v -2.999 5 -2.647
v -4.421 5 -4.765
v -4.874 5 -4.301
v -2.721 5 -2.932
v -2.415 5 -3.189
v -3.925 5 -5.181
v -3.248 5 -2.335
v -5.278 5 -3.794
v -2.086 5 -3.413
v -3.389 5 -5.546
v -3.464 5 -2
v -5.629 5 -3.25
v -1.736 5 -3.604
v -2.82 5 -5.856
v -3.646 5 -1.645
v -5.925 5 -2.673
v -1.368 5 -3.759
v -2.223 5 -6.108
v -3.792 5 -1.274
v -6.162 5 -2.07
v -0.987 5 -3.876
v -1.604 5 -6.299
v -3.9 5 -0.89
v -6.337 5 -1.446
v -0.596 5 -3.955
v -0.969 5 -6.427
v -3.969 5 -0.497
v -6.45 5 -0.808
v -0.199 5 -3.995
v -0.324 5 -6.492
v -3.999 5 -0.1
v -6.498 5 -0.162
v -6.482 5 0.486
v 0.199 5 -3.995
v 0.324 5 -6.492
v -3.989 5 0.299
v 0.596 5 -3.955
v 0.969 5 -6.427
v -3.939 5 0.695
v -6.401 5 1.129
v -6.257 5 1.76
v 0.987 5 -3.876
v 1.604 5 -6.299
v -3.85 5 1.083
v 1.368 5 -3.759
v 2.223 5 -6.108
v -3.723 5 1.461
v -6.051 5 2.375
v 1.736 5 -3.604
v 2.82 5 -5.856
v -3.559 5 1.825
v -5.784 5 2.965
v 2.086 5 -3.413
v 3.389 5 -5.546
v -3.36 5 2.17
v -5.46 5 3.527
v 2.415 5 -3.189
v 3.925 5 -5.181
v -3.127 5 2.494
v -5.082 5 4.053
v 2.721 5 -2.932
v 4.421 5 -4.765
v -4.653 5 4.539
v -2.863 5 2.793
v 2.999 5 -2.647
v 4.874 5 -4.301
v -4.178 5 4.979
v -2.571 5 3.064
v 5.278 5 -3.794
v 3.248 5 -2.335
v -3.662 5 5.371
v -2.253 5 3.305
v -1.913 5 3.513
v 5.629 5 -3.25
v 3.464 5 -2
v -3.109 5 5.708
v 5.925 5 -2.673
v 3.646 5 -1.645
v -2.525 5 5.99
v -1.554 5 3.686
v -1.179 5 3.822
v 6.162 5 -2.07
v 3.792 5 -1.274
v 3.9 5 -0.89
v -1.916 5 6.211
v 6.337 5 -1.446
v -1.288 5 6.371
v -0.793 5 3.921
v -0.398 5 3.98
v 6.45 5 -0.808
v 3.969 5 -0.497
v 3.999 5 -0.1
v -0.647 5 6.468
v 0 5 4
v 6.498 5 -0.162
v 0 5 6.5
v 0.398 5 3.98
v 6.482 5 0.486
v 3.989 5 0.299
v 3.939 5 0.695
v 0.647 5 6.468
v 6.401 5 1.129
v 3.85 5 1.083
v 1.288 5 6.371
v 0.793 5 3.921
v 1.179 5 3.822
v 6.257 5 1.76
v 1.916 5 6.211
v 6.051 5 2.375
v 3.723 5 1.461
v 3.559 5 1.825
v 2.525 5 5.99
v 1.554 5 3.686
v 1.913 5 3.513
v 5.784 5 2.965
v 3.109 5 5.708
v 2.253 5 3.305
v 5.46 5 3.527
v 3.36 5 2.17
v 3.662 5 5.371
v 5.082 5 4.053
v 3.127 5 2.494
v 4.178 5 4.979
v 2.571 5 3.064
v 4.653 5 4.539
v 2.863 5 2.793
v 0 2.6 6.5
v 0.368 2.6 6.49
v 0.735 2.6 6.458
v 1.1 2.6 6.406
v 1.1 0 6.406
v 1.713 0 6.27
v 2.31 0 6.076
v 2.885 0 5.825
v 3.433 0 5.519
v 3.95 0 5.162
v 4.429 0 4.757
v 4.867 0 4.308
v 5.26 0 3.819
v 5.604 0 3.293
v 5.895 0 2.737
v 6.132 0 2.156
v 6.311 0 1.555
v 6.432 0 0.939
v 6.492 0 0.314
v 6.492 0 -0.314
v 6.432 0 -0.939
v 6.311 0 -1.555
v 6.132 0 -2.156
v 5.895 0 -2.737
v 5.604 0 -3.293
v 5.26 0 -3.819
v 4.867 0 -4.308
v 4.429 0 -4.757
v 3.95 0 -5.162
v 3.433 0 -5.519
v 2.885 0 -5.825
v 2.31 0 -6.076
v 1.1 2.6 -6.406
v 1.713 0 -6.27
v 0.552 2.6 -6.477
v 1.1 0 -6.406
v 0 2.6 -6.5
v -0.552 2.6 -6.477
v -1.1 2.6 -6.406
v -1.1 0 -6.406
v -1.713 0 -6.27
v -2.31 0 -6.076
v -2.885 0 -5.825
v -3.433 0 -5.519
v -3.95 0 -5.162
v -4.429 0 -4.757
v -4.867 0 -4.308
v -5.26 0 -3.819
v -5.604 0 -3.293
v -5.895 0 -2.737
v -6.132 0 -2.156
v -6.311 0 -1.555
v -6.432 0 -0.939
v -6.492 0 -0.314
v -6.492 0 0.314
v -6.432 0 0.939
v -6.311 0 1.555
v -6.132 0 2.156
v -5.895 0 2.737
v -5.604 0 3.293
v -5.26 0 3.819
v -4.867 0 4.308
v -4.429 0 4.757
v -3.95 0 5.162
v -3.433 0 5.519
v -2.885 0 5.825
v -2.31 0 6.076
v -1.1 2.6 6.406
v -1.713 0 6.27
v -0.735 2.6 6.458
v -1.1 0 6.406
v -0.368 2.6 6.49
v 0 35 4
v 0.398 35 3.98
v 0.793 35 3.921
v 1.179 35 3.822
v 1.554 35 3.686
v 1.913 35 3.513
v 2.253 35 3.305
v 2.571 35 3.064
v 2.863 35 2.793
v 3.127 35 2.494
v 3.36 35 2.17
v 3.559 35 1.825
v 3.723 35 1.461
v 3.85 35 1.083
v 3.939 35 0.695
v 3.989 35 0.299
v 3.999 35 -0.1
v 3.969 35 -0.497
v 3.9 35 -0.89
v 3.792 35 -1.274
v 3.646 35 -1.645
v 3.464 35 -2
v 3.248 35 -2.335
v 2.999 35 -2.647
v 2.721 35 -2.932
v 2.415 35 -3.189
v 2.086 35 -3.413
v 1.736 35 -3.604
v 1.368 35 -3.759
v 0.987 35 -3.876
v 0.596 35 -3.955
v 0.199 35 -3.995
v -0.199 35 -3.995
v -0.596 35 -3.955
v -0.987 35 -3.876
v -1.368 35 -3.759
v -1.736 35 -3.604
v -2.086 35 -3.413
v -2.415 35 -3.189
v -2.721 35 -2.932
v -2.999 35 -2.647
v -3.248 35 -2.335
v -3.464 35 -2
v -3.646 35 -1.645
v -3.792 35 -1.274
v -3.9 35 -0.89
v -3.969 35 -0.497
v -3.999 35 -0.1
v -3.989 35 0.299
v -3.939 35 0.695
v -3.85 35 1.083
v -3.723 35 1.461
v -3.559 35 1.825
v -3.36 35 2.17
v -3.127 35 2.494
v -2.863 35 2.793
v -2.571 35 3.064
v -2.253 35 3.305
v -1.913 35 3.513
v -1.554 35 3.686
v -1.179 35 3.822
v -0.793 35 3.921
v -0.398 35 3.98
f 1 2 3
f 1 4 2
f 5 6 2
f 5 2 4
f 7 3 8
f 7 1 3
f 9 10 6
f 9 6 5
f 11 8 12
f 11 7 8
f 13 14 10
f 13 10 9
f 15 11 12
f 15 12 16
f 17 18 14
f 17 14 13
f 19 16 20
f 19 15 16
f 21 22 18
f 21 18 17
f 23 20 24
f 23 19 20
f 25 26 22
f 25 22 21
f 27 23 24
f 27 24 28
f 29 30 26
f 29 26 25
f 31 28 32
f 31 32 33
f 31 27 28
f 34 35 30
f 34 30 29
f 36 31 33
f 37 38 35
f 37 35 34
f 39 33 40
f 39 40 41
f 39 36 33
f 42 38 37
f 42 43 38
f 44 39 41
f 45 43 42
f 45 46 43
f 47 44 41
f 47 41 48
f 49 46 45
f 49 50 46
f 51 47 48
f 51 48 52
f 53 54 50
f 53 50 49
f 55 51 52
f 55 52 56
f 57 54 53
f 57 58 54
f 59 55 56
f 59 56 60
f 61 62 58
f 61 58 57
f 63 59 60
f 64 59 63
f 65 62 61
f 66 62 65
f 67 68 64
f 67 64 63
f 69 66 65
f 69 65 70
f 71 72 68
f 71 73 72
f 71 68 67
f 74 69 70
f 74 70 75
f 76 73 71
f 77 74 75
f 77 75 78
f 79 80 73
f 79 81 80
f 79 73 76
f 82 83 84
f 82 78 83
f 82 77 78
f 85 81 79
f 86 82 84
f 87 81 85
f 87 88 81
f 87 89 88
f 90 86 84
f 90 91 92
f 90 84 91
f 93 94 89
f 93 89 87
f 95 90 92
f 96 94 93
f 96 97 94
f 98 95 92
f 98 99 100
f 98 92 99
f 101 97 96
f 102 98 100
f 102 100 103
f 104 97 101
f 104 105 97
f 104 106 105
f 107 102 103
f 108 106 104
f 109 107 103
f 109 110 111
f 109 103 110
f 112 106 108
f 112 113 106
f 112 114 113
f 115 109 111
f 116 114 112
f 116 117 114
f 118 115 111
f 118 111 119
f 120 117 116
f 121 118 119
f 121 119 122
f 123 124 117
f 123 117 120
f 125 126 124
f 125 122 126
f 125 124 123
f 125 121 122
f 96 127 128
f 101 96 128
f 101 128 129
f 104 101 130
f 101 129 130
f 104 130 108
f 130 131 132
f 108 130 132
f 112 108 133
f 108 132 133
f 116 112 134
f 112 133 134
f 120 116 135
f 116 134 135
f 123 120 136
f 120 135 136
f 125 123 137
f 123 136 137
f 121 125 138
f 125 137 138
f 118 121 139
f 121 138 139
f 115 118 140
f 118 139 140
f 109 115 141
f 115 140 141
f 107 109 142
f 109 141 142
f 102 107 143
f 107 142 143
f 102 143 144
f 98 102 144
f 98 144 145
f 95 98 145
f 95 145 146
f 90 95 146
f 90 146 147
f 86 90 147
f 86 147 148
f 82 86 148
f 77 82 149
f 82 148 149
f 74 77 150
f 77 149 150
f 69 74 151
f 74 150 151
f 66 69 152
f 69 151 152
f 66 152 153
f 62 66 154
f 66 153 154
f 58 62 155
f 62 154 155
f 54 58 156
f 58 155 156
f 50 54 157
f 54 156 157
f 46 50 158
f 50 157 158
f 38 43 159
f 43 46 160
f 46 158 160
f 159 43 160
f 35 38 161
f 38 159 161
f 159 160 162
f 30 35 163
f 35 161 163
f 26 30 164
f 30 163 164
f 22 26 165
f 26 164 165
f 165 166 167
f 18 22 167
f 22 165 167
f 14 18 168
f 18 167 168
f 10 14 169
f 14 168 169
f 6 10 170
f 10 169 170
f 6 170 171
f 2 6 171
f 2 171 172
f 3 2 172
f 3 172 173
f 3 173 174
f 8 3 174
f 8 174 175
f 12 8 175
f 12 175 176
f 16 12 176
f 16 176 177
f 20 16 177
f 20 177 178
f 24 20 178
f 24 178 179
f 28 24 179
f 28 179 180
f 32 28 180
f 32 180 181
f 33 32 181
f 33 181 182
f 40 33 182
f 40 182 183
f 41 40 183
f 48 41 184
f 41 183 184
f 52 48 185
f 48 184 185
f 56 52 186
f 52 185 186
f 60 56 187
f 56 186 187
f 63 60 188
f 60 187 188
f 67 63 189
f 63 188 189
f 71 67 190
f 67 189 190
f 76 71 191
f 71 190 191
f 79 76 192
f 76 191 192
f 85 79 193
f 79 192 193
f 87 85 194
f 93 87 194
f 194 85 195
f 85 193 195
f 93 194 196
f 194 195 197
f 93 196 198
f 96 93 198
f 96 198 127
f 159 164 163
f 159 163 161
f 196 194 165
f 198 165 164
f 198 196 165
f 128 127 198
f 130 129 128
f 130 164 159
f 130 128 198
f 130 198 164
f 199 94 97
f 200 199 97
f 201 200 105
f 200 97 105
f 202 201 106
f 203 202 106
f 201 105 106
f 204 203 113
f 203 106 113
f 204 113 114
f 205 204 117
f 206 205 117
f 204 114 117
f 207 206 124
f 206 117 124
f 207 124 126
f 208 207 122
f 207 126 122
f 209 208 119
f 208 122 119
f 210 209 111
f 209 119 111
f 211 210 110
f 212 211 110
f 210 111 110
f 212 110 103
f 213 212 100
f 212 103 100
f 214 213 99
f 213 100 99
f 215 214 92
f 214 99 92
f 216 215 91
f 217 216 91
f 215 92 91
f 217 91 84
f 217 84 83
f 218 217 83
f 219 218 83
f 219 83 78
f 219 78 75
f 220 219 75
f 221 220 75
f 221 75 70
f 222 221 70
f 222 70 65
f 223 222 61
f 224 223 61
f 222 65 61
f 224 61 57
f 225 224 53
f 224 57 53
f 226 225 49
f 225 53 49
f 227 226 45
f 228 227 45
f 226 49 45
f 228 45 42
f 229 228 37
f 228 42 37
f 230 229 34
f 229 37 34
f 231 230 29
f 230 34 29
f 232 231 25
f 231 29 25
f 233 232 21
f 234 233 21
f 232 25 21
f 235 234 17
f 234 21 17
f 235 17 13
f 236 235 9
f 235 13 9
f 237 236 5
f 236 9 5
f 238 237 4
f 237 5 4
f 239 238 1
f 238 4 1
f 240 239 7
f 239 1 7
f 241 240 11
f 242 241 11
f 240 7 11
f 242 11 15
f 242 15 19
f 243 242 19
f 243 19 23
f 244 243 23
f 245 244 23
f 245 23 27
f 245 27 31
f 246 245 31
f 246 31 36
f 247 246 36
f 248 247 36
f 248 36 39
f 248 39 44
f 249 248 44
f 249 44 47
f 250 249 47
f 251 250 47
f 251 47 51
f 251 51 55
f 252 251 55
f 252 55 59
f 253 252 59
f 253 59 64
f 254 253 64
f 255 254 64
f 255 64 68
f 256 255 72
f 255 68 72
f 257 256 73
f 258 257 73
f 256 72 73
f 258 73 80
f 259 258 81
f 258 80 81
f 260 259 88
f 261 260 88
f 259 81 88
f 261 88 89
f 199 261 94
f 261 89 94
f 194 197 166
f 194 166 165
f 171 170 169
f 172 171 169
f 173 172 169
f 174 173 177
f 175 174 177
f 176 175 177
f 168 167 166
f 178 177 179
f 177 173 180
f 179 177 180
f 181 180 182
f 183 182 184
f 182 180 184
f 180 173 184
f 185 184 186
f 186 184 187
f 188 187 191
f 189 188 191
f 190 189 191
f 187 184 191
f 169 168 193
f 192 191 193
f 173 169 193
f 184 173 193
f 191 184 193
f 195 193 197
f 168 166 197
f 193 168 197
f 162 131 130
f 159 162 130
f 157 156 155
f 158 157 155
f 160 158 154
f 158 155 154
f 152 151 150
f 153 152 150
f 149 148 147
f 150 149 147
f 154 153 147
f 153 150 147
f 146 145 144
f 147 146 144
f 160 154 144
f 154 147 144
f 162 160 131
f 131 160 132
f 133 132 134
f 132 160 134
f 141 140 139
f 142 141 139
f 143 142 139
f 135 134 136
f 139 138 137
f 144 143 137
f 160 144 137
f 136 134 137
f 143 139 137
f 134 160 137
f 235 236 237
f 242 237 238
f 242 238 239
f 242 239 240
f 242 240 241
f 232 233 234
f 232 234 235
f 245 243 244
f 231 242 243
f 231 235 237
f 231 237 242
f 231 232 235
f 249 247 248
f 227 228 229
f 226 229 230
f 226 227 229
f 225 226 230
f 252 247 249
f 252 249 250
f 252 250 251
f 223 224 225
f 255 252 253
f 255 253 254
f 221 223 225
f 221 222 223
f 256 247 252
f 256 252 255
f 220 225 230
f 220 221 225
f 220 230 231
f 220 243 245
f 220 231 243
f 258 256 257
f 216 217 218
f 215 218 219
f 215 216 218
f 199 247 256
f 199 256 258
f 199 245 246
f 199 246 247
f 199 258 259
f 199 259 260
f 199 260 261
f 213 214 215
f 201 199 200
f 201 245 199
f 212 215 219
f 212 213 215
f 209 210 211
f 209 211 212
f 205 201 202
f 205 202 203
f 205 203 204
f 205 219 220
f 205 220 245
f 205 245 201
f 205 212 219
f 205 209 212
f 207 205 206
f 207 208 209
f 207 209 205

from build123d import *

# Parameters (mm, degrees)
SKETCH_1_R          = 6.5
EXTRUDE_1_DEPTH     = 5
SKETCH_2_W          = 2.2
SKETCH_2_H          = 2.6
CUT_EXTRUDE_1_DEPTH = 6.95
SKETCH_3_R          = 4
EXTRUDE_2_DEPTH     = 30


with BuildPart() as part:
    # Эскиз1 → Бобышка-Вытянуть1 (new body)
    with BuildSketch(Plane(origin=(0, 0, 0), x_dir=(1, 0, 0), z_dir=(0, 1, 0))):
        with Locations(Location((0, 0, 0), (0, 0, 270))):
            Circle(SKETCH_1_R)
    extrude(amount=EXTRUDE_1_DEPTH)

    # Эскиз2 → Вырез-Вытянуть1 (cut, symmetric)
    with BuildSketch(Plane.XY):
        with Locations((0, 1.3)):
            Rectangle(SKETCH_2_W, SKETCH_2_H)
    extrude(amount=CUT_EXTRUDE_1_DEPTH, both=True, mode=Mode.SUBTRACT)

    # Эскиз3 → Бобышка-Вытянуть2 (add)
    with BuildSketch(Plane(origin=(0, 5, 0), x_dir=(1, 0, 0), z_dir=(0, 1, 0))):
        with Locations(Location((0, 0, 0), (0, 0, 270))):
            Circle(SKETCH_3_R)
    extrude(amount=EXTRUDE_2_DEPTH)


solid = part.part
